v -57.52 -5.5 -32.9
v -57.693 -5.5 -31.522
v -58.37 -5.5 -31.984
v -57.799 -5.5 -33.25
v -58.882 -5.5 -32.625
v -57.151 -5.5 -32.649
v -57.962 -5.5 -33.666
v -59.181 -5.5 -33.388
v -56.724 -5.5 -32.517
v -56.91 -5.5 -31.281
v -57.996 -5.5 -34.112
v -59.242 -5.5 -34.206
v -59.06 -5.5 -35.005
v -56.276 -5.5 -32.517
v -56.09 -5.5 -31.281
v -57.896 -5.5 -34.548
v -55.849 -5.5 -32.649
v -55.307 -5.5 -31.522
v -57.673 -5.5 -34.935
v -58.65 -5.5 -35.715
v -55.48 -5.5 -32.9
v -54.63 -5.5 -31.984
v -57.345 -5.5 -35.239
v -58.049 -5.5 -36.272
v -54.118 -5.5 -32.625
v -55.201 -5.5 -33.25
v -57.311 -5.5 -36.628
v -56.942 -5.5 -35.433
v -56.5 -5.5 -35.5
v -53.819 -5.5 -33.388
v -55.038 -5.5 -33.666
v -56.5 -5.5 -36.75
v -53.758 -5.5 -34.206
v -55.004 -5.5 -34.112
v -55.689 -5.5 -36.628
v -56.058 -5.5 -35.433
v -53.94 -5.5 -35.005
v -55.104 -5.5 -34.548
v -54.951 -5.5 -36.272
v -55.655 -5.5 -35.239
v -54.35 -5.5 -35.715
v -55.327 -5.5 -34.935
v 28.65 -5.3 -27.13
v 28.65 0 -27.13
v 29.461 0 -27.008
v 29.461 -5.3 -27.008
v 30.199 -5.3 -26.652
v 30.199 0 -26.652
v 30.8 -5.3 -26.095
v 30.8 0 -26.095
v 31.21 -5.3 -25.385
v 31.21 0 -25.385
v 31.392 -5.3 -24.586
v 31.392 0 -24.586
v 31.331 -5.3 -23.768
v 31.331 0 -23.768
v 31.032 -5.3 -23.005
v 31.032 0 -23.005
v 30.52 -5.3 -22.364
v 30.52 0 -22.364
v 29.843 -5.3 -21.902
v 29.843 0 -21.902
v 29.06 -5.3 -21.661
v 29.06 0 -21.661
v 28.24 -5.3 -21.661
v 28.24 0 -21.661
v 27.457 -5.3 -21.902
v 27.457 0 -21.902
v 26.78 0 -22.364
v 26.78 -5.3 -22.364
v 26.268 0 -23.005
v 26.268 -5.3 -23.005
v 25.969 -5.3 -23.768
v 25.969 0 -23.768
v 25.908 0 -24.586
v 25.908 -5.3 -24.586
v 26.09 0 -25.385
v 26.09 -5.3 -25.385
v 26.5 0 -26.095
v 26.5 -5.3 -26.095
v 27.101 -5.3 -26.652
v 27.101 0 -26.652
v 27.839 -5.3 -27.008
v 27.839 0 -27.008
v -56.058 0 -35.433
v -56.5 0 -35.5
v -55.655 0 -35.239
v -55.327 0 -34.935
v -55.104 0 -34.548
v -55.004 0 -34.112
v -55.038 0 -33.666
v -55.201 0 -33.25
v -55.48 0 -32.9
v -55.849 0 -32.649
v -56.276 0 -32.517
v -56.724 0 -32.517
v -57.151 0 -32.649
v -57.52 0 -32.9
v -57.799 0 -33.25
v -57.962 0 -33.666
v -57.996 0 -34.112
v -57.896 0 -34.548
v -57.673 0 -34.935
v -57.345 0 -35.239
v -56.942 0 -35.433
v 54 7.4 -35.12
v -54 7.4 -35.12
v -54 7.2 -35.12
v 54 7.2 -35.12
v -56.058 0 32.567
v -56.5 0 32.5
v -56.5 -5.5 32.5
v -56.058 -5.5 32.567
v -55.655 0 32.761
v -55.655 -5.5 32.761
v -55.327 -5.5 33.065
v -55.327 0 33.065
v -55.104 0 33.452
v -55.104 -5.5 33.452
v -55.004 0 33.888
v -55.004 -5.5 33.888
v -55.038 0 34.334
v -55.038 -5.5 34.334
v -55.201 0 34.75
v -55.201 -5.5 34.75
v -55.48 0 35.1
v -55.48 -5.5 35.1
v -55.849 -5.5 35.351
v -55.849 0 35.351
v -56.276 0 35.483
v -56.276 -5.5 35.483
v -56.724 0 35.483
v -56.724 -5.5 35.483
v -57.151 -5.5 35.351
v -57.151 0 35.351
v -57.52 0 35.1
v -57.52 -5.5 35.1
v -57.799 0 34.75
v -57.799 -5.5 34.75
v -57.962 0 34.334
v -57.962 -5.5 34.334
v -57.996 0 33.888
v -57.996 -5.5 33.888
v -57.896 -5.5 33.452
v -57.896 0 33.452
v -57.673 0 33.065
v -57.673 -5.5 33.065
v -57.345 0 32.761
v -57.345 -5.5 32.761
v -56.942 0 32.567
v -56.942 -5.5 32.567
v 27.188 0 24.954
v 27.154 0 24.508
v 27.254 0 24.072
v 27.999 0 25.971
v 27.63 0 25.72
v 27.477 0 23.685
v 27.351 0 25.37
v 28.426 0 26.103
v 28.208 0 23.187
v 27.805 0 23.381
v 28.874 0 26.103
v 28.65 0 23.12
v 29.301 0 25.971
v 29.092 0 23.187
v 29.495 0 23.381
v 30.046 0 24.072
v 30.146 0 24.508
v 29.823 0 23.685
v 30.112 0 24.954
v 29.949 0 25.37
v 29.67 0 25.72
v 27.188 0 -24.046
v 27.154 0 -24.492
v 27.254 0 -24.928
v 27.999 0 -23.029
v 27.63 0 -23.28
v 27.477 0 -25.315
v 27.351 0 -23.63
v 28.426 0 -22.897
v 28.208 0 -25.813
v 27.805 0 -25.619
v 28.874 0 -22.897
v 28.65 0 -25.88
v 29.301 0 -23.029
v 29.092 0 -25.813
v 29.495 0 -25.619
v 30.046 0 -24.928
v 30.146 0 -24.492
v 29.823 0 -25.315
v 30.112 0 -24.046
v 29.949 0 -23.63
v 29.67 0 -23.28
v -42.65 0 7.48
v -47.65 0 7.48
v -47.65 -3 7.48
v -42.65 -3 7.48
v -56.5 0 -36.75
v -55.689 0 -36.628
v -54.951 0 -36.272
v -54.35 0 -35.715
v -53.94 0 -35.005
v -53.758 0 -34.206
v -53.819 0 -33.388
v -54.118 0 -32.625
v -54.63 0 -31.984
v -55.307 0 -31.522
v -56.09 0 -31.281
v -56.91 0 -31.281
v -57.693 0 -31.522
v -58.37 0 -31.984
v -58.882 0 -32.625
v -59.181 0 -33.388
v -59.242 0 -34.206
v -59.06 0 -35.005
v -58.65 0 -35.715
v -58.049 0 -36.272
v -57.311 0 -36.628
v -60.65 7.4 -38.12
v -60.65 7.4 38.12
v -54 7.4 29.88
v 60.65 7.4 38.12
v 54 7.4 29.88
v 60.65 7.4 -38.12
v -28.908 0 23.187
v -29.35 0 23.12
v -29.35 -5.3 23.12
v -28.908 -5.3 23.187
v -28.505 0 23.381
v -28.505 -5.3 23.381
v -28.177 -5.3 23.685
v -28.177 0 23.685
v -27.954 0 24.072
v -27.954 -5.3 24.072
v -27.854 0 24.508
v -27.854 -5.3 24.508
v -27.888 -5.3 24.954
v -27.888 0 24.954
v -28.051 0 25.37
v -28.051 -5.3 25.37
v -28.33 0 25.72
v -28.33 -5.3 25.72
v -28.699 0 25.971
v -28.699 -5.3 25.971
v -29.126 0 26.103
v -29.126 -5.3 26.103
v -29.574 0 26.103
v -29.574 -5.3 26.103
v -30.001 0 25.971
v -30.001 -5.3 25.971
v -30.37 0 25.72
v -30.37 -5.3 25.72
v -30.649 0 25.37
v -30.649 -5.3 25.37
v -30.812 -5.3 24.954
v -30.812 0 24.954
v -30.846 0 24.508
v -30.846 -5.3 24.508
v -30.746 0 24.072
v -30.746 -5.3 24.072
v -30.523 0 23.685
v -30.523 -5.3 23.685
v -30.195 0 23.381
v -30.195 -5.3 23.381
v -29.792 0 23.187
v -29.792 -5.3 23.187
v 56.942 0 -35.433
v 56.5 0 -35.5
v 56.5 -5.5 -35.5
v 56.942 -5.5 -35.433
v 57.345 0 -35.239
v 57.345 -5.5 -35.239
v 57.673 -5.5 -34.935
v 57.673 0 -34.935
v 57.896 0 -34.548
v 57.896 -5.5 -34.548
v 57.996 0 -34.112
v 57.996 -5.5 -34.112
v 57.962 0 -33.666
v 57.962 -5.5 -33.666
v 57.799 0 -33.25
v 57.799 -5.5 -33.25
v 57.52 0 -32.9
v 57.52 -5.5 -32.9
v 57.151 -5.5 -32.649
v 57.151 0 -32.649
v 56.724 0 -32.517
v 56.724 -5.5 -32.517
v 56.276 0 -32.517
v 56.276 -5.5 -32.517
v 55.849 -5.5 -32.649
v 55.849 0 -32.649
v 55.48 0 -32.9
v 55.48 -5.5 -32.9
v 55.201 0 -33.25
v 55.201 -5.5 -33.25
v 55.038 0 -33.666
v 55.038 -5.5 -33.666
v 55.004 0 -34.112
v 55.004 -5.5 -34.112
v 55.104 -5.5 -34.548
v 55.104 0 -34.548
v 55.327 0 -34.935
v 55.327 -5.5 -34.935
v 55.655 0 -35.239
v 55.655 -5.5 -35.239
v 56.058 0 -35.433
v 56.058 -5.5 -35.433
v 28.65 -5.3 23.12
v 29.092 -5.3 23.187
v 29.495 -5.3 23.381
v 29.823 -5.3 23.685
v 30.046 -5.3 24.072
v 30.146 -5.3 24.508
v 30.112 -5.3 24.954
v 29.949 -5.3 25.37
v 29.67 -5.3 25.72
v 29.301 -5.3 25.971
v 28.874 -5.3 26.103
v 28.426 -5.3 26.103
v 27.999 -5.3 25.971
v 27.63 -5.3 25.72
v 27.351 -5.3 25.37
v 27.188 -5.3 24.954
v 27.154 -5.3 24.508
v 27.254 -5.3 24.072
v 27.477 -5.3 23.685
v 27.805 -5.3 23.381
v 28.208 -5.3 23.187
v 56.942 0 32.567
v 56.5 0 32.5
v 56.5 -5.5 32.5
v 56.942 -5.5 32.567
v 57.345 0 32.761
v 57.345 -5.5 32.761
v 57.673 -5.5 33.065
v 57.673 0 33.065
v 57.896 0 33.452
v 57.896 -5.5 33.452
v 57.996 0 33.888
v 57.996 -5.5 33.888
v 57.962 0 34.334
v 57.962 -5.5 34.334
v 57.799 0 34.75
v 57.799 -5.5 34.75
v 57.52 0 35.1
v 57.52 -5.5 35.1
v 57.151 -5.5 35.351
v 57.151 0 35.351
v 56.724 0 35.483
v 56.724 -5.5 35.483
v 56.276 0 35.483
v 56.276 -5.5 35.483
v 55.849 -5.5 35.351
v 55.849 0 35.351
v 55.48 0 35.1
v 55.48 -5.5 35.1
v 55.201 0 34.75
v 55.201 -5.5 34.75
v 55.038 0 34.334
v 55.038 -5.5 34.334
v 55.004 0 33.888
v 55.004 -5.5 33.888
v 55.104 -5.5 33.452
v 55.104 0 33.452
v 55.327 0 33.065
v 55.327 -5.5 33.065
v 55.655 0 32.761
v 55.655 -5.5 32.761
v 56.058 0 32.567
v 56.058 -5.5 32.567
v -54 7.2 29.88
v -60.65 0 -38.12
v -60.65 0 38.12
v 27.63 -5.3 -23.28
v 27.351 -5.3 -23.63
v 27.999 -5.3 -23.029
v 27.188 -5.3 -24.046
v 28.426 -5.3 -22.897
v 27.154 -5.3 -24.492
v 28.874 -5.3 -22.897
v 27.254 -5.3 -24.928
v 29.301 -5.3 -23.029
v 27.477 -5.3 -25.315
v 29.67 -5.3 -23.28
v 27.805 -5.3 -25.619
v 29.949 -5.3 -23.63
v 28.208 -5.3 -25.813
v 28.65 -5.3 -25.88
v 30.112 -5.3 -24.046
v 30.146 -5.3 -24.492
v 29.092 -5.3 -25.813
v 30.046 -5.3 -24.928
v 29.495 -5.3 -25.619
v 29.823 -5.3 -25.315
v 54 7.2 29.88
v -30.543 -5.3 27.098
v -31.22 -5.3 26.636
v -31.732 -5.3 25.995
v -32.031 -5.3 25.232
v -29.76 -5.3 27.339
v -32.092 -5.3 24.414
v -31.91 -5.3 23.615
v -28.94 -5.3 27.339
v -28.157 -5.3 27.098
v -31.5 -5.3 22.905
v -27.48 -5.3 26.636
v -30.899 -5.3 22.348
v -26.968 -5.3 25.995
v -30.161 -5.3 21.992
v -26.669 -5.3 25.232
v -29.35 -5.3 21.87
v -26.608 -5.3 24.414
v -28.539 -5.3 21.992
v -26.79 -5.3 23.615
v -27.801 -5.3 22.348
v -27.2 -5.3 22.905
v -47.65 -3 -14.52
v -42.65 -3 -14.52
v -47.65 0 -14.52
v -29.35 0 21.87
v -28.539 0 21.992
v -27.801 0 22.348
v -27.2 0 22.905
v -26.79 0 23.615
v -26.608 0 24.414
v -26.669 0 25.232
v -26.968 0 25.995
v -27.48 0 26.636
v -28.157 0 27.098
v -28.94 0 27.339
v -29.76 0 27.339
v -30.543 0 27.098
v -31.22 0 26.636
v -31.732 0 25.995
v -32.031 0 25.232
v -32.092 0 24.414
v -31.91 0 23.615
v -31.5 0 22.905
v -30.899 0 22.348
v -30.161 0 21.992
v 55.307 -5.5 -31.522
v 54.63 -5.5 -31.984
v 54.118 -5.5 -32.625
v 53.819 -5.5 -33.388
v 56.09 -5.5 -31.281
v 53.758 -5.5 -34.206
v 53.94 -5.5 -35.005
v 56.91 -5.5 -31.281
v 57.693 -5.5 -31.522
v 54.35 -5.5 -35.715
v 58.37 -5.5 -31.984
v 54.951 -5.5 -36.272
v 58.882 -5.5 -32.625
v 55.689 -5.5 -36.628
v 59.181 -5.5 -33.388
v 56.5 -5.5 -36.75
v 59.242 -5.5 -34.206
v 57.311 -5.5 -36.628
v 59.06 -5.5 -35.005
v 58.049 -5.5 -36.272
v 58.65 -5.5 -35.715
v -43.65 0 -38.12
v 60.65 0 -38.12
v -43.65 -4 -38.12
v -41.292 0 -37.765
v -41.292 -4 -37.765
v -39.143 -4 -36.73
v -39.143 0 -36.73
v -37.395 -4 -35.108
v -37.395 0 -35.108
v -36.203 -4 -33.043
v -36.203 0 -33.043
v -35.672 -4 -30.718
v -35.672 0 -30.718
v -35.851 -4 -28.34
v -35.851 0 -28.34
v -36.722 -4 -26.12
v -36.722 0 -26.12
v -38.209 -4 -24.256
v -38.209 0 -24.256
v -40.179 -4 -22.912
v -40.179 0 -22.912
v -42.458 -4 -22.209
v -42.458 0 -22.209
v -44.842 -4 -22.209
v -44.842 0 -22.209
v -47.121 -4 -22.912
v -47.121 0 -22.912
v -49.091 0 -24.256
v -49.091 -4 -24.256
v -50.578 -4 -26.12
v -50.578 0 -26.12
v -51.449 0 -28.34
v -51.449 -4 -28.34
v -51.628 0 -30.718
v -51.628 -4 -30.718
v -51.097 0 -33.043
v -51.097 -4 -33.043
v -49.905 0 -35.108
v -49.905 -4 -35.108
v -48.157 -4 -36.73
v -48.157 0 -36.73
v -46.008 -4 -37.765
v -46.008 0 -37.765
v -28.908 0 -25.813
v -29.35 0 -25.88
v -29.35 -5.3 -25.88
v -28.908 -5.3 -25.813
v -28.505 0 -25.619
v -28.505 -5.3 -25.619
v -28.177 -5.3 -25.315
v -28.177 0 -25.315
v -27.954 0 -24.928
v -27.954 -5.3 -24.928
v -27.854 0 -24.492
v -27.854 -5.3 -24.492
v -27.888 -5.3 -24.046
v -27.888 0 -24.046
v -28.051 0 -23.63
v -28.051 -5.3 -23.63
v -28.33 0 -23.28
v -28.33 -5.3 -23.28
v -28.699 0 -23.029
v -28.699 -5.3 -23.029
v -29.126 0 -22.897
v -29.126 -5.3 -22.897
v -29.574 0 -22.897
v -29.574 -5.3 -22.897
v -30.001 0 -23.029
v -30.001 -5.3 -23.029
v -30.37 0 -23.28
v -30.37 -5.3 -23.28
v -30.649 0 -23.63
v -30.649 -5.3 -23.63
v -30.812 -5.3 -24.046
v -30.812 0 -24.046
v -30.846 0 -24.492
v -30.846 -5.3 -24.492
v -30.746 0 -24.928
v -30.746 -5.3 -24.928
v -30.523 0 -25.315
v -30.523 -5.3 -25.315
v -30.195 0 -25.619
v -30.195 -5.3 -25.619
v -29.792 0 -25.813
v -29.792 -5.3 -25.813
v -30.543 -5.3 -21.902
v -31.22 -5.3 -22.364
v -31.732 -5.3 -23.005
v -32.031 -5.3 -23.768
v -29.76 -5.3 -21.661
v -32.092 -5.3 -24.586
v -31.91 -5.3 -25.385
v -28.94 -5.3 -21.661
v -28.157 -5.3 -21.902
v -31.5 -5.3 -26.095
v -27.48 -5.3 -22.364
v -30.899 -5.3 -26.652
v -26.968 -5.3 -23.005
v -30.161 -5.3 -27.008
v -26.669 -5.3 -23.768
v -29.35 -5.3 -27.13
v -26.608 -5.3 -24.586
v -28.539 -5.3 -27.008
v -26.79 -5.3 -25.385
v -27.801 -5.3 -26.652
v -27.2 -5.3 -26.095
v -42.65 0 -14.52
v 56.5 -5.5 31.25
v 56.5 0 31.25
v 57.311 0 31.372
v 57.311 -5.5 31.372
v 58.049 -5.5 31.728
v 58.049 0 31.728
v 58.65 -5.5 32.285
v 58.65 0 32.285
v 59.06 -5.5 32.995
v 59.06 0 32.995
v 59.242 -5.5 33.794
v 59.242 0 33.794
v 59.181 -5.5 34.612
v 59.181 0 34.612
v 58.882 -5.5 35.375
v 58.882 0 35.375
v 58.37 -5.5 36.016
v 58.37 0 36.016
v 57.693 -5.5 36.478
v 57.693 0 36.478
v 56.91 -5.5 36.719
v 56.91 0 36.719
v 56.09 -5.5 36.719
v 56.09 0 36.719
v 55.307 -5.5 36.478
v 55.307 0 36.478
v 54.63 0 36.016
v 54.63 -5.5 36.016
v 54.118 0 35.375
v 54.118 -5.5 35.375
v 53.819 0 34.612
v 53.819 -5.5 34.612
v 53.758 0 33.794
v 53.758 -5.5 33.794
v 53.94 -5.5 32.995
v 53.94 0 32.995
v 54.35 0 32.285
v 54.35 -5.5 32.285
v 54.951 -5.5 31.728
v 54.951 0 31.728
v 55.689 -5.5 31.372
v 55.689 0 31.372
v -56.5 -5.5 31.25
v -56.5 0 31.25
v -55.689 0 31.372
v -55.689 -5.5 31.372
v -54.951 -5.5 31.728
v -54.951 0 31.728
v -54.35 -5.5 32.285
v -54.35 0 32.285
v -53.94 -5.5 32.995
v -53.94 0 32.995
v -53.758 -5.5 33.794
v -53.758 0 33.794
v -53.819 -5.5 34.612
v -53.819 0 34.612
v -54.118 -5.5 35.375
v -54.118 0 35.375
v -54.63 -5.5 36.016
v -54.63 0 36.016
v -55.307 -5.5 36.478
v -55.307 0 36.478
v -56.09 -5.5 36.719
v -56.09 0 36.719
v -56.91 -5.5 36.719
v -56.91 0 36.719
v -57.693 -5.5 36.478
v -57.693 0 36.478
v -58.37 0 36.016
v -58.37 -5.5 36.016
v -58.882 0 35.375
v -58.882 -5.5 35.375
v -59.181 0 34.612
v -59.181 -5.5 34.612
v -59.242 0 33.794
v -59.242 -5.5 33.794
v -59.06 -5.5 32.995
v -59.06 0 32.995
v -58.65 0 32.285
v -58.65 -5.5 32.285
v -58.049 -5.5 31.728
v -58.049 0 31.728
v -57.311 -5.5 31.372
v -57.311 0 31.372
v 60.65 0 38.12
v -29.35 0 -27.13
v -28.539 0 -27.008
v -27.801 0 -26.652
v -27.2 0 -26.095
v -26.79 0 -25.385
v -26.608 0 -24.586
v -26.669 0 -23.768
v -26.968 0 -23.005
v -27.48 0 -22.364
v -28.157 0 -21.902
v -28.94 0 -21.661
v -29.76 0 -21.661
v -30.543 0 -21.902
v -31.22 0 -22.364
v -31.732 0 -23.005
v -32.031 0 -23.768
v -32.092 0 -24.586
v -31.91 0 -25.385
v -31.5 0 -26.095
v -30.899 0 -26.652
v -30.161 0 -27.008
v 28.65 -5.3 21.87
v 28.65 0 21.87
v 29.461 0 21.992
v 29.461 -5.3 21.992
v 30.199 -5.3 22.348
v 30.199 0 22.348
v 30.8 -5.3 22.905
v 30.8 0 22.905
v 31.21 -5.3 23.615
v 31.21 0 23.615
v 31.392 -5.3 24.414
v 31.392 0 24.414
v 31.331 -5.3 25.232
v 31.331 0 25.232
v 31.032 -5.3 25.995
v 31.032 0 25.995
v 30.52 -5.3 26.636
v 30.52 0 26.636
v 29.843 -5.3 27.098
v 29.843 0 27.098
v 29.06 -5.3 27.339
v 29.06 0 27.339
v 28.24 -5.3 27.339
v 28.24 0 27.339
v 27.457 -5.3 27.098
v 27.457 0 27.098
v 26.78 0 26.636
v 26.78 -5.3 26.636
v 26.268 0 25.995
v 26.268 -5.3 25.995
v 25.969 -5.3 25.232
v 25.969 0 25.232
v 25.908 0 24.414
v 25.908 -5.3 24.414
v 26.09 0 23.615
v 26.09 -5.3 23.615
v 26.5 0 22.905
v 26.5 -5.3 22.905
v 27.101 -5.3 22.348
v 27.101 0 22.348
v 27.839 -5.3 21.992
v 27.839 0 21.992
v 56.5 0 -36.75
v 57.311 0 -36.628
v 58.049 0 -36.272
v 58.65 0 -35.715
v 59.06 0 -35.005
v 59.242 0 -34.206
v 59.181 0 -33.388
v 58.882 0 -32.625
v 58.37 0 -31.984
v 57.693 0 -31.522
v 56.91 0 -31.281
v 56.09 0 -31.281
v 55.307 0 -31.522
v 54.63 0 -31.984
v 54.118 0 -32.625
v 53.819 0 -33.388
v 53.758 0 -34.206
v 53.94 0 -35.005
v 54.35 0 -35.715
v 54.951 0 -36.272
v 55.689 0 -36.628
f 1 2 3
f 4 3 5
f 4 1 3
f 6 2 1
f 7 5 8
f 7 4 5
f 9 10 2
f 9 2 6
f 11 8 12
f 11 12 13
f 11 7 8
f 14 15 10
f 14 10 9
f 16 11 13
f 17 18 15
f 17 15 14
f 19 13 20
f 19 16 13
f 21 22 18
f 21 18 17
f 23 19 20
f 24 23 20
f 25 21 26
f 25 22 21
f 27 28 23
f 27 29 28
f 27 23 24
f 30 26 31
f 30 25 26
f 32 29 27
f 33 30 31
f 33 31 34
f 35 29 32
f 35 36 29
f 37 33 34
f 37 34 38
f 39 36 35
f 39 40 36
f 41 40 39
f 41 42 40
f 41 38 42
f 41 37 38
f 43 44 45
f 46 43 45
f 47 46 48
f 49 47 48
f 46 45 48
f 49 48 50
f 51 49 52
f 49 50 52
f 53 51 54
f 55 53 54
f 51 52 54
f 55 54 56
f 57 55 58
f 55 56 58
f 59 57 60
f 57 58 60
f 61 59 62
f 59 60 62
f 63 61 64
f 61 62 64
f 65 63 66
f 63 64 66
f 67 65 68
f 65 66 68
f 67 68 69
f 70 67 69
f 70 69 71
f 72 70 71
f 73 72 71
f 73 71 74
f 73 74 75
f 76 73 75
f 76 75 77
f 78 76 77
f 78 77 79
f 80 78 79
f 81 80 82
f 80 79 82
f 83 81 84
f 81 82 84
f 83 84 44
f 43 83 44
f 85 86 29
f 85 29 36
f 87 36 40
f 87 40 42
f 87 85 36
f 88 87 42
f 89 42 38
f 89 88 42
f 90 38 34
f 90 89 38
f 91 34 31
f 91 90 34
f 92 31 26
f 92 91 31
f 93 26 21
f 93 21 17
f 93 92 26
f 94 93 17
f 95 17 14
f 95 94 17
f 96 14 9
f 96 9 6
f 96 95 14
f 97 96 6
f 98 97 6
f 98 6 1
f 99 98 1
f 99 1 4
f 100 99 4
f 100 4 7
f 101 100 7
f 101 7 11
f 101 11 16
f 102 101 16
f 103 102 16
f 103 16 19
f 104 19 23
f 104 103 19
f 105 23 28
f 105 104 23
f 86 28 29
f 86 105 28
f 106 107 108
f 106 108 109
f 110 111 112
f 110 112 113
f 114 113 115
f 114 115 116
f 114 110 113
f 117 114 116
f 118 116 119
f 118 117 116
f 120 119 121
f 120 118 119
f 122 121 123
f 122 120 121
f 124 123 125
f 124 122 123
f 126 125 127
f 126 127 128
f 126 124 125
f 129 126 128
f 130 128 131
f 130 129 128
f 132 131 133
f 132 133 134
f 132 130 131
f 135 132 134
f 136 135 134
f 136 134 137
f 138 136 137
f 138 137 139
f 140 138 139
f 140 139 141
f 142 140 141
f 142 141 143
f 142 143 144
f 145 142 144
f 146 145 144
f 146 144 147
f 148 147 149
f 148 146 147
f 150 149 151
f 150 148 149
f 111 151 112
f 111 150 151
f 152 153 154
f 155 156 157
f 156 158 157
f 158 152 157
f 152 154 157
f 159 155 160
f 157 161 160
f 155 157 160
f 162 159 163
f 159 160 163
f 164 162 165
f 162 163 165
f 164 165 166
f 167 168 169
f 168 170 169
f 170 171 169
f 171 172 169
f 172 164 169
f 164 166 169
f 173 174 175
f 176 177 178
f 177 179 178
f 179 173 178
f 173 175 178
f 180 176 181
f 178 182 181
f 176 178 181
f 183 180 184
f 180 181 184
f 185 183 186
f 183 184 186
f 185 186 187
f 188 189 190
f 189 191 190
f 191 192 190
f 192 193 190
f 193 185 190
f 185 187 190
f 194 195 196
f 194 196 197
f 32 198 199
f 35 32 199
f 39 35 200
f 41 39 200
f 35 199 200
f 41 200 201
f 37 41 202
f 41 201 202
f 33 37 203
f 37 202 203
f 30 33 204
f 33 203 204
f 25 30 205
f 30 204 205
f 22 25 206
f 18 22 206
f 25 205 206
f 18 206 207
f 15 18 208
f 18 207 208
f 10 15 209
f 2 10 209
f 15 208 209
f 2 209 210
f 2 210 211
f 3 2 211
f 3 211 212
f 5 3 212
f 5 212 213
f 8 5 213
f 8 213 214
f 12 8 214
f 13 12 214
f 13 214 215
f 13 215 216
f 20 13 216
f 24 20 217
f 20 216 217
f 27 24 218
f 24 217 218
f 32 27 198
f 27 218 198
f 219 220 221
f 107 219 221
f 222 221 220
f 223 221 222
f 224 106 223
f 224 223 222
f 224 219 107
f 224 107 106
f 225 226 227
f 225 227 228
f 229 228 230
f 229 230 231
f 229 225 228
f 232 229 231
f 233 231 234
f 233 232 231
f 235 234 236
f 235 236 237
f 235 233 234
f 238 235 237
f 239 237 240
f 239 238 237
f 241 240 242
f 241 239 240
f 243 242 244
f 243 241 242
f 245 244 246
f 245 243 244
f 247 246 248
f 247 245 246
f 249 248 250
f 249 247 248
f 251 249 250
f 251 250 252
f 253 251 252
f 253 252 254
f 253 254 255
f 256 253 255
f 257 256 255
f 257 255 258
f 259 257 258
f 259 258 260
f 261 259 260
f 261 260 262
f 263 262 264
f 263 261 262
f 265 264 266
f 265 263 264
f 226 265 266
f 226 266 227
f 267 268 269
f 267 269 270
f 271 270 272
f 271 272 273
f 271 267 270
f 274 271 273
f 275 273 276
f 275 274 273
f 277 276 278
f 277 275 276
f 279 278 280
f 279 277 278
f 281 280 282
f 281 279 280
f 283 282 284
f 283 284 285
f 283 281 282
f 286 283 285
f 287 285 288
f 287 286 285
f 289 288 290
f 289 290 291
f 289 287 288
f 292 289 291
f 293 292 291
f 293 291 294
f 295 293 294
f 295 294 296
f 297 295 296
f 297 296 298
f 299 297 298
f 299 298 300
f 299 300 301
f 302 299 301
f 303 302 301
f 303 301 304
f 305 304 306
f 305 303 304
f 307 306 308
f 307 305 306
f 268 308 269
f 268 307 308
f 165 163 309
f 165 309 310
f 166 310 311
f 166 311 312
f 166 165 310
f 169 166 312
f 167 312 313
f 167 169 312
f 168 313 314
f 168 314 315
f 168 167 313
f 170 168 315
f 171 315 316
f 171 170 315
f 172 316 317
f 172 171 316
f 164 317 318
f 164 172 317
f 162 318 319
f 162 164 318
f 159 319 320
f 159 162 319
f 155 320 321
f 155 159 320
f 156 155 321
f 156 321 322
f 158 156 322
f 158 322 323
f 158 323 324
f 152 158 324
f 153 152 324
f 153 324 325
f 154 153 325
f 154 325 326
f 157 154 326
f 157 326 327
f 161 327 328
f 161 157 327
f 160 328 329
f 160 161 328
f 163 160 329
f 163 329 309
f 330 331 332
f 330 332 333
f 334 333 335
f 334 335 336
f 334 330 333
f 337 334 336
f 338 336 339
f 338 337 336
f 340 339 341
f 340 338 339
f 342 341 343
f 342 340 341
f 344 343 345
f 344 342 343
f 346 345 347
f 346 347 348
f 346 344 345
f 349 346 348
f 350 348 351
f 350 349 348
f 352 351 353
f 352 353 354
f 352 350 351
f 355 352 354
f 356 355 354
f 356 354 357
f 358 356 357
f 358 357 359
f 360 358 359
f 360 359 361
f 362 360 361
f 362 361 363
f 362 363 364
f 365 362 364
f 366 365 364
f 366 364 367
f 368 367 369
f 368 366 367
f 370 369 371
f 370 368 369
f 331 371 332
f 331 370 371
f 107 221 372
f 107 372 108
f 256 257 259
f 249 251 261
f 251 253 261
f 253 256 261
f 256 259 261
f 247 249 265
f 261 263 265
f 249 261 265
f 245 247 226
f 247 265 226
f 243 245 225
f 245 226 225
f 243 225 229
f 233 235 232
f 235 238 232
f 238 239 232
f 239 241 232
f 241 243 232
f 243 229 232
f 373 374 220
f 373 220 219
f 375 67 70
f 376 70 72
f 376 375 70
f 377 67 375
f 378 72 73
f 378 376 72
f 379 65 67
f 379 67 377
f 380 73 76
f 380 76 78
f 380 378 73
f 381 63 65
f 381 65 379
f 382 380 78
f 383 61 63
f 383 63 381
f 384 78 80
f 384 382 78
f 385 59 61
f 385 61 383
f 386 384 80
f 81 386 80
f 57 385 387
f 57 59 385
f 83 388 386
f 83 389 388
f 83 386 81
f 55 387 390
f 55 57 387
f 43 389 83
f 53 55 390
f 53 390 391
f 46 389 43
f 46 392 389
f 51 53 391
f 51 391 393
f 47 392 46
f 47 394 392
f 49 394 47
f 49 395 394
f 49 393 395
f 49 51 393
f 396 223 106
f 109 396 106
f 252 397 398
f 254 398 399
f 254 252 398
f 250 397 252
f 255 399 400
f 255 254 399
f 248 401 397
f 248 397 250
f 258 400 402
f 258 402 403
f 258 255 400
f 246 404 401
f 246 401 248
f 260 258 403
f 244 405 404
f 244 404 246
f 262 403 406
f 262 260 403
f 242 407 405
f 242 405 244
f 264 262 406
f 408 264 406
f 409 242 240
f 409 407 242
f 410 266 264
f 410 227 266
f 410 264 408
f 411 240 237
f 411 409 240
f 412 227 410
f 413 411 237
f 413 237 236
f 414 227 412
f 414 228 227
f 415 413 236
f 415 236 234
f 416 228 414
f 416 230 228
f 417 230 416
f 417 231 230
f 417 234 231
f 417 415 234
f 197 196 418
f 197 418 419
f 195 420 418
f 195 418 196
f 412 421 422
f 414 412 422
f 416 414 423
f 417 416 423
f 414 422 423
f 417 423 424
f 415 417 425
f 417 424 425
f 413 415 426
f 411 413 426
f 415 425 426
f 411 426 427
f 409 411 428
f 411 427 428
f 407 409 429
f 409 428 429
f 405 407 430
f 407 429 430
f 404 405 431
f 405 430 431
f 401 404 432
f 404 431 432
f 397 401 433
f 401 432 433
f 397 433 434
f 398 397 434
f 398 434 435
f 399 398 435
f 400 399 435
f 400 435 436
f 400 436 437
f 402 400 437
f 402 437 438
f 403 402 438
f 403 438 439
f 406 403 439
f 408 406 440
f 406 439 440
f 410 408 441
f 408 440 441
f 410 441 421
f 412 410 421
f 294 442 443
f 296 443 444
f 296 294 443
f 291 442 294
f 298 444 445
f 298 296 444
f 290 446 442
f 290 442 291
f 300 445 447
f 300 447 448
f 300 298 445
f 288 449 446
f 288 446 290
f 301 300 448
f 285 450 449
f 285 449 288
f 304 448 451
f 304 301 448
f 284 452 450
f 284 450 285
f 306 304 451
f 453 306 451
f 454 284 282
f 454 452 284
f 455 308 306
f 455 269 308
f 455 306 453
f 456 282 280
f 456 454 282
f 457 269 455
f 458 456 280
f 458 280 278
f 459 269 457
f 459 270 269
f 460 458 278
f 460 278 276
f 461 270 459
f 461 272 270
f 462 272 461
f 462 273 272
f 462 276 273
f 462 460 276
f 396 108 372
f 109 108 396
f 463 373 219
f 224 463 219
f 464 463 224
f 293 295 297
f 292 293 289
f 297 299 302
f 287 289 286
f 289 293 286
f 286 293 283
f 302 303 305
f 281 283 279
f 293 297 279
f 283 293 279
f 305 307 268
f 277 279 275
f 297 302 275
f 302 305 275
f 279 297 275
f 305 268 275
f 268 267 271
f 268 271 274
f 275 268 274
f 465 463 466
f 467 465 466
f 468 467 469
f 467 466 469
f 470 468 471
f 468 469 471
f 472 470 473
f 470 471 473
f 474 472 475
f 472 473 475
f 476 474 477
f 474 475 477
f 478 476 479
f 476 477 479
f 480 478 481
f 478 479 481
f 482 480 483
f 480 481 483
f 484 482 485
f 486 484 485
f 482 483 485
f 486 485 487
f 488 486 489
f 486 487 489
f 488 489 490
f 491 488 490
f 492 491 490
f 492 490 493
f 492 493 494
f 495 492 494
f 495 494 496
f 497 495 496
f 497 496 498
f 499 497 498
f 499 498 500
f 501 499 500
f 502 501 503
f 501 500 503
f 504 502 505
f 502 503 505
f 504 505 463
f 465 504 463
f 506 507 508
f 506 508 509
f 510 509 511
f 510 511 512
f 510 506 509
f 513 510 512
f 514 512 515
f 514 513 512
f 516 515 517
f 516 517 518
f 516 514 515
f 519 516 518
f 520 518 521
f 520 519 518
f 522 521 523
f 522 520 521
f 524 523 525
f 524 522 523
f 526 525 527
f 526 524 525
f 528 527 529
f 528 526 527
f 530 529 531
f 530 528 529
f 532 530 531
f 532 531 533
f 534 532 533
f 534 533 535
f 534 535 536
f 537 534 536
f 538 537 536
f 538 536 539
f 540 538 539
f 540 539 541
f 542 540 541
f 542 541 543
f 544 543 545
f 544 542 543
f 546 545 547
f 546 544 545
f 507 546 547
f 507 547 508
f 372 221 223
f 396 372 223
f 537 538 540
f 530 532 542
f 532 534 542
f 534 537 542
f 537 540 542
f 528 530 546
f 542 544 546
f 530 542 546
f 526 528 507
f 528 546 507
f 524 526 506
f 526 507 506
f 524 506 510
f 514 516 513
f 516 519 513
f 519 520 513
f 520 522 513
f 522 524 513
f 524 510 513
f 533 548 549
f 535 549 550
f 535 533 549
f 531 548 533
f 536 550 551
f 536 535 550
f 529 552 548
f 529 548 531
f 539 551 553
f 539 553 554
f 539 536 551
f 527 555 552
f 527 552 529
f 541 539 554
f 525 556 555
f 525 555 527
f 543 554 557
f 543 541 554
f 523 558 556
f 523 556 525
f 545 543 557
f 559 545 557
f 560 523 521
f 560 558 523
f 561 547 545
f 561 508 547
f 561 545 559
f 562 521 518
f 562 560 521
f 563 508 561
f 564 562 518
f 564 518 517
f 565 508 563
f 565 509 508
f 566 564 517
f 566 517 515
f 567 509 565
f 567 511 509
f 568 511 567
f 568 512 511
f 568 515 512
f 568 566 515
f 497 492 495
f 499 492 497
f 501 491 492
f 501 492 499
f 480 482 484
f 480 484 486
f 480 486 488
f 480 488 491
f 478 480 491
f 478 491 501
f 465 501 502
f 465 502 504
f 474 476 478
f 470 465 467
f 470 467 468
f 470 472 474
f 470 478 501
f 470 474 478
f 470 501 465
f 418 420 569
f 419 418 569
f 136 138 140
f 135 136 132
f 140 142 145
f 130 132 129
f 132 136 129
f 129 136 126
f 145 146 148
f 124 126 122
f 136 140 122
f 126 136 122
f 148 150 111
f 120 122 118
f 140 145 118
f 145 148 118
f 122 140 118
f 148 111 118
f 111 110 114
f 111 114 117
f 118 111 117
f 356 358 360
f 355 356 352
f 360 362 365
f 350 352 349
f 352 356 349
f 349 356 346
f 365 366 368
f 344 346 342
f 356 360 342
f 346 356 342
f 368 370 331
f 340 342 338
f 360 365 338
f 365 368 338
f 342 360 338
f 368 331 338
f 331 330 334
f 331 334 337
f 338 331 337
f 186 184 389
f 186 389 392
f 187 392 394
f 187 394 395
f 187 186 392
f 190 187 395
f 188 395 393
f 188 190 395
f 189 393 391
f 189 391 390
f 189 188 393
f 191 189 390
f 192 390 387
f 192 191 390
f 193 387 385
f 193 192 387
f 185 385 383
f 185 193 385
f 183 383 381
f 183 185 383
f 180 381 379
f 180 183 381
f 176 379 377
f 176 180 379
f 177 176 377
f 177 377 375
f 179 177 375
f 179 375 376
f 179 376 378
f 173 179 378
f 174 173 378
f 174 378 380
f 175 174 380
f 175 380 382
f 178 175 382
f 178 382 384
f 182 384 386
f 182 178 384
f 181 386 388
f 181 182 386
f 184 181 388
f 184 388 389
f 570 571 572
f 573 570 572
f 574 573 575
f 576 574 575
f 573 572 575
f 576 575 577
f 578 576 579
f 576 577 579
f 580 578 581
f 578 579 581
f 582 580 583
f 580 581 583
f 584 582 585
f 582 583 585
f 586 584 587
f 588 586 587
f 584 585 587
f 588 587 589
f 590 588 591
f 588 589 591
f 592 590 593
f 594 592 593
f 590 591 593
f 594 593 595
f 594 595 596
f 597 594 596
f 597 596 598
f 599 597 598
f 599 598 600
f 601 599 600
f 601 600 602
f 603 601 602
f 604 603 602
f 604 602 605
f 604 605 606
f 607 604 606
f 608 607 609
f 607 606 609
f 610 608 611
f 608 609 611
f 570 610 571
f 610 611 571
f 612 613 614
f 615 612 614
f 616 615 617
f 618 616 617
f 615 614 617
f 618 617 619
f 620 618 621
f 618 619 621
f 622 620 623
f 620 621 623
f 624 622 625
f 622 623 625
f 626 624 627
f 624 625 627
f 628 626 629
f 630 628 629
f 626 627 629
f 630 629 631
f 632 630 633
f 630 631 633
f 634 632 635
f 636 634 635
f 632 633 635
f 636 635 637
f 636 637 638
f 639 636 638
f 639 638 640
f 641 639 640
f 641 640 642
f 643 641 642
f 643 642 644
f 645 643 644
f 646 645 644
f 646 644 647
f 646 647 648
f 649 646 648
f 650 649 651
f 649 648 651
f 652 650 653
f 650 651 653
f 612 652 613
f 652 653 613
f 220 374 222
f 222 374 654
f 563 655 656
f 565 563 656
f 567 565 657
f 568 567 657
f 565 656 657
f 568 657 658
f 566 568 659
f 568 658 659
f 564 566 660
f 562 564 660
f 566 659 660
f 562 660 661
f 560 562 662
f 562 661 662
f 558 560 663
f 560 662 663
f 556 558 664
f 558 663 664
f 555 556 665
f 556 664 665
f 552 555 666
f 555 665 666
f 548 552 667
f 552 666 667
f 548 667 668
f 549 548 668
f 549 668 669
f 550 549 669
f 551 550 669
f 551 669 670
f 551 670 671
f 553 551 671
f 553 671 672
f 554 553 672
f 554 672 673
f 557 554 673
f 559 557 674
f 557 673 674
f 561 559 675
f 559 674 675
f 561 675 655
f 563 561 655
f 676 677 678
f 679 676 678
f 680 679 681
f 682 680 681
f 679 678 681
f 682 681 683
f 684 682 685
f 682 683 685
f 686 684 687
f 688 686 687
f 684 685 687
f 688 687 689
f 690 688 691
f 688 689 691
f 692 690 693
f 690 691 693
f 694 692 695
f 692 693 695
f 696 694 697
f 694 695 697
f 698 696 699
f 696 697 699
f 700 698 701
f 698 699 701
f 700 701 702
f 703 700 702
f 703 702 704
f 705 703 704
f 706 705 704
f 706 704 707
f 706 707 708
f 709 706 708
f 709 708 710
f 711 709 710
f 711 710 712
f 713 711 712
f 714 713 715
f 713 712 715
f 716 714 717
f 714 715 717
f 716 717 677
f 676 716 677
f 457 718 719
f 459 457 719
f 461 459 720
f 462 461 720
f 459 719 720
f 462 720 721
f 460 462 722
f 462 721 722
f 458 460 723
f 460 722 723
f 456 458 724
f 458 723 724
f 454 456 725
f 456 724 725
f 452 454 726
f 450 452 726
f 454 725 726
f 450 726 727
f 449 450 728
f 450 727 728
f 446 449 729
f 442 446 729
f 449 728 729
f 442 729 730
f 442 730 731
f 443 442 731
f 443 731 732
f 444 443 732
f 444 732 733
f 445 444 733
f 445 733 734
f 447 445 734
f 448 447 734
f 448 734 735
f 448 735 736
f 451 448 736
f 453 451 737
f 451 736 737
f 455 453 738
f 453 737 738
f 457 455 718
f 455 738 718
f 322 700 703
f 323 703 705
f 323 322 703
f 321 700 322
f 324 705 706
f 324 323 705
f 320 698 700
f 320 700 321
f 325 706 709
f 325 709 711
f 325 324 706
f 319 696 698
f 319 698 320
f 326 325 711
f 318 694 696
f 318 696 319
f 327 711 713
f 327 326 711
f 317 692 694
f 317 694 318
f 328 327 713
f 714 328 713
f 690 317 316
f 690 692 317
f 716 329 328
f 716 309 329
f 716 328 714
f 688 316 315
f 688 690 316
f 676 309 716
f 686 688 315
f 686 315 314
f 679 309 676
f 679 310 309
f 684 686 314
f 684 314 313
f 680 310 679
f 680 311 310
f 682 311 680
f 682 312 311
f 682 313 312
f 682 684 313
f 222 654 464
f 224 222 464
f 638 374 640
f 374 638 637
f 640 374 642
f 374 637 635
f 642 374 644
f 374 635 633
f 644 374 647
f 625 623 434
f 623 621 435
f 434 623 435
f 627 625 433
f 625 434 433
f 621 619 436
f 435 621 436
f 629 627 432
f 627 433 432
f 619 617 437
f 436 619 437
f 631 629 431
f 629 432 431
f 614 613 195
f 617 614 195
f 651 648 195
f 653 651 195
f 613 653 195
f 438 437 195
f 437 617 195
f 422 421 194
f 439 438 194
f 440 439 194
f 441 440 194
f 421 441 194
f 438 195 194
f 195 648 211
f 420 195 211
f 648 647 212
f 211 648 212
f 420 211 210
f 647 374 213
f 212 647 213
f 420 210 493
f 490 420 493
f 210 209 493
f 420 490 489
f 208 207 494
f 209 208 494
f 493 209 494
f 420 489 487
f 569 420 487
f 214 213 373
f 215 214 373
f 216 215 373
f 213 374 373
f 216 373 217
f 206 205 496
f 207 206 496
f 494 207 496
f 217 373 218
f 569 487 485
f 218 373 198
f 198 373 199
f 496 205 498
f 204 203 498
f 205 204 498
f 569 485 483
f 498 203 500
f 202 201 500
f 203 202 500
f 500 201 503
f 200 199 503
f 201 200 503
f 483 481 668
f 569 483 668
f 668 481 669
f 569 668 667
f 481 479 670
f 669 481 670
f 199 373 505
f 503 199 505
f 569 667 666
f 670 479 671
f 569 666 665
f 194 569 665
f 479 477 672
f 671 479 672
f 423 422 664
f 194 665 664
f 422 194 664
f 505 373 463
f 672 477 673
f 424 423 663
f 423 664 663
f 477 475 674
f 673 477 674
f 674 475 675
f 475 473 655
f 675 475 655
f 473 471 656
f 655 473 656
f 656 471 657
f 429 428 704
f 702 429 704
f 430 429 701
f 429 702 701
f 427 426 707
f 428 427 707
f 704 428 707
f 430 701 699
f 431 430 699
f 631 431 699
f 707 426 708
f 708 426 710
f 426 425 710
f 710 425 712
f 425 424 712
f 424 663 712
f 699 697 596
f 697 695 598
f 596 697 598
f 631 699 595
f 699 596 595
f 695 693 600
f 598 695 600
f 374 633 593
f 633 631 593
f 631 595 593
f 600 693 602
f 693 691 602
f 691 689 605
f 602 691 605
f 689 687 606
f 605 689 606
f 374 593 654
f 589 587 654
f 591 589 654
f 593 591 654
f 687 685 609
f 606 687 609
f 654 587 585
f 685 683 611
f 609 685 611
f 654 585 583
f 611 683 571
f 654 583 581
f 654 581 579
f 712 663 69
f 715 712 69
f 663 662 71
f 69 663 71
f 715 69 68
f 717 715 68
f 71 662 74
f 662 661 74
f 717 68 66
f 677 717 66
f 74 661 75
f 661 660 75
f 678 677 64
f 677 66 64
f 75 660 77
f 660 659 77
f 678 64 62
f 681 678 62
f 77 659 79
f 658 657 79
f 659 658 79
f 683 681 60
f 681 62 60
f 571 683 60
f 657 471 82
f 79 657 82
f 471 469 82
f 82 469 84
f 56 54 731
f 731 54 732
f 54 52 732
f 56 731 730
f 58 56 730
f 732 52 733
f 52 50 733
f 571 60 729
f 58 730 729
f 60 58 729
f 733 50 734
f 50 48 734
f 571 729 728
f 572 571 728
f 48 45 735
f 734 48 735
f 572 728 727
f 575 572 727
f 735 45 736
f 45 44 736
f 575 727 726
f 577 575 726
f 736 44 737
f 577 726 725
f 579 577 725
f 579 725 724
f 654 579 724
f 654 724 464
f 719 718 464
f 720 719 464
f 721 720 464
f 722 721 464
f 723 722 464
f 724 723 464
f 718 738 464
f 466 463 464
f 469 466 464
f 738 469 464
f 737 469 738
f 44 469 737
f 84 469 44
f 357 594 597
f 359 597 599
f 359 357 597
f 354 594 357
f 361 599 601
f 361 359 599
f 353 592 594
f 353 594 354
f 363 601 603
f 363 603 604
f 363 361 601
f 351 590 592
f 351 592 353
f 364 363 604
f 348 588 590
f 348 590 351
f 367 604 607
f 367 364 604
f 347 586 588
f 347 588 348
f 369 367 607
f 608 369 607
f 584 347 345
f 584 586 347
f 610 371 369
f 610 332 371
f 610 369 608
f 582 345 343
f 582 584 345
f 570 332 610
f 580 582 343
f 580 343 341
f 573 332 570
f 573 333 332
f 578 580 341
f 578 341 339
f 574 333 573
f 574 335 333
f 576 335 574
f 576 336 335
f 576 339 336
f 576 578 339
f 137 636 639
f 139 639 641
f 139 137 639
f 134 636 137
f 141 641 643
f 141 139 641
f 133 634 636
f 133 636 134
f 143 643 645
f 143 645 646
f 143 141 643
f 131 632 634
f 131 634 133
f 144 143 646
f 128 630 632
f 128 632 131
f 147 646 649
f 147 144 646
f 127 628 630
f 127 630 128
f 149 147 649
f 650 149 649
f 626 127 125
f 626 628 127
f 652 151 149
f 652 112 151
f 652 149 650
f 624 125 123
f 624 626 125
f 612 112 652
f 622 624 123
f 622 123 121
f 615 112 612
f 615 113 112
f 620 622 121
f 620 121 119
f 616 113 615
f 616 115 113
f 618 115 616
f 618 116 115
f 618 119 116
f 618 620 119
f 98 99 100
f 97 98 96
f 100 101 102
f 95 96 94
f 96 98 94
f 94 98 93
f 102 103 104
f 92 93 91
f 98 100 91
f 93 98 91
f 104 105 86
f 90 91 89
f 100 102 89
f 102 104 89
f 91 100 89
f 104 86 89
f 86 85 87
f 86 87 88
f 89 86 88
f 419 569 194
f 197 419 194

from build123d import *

# Parameters (mm, degrees)
SKETCH1_W           = 121.3
SKETCH1_H           = 76.24
BOSS_EXTRUDE1_DEPTH = 7.4
SKETCH2_R           = 2.75
SKETCH2_R_2         = 1.5
BOSS_EXTRUDE2_DEPTH = 5.5
SKETCH3_R           = 2.75
SKETCH3_R_2         = 1.5
BOSS_EXTRUDE3_DEPTH = 5.3
SKETCH4_W           = 108
SKETCH4_H           = 65
CUT_EXTRUDE1_DEPTH  = 0.2
SKETCH5_R           = 8
BOSS_EXTRUDE4_DEPTH = 4
SKETCH6_W           = 5
SKETCH6_H           = 22
BOSS_EXTRUDE5_DEPTH = 3


with BuildPart() as part:
    # Sketch1 → Boss-Extrude1 (new body)
    with BuildSketch(Plane(origin=(0, 0, 0), x_dir=(1, 0, 0), z_dir=(0, 1, 0))):
        Rectangle(SKETCH1_W, SKETCH1_H)
    extrude(amount=BOSS_EXTRUDE1_DEPTH)

    # Sketch2 → Boss-Extrude2 (add)
    # profile 1 of 4: a face of its own
    with BuildSketch(Plane.XZ):
        with Locations(Location((-56.5, 34, 0), (0, 0, 270))):
            Circle(SKETCH2_R)
        with Locations(Location((-56.5, 34, 0), (0, 0, 270))):
            Circle(SKETCH2_R_2, mode=Mode.SUBTRACT)
    # profile 2 of 4: a face of its own
    with BuildSketch(Plane.XZ):
        with Locations(Location((56.5, 34, 0), (0, 0, 270))):
            Circle(SKETCH2_R)
        with Locations(Location((56.5, 34, 0), (0, 0, 270))):
            Circle(SKETCH2_R_2, mode=Mode.SUBTRACT)
    # profile 3 of 4: a face of its own
    with BuildSketch(Plane.XZ):
        with Locations(Location((56.5, -34, 0), (0, 0, 270))):
            Circle(SKETCH2_R)
        with Locations(Location((56.5, -34, 0), (0, 0, 270))):
            Circle(SKETCH2_R_2, mode=Mode.SUBTRACT)
    # profile 4 of 4: a face of its own
    with BuildSketch(Plane.XZ):
        with Locations(Location((-56.5, -34, 0), (0, 0, 270))):
            Circle(SKETCH2_R)
        with Locations(Location((-56.5, -34, 0), (0, 0, 270))):
            Circle(SKETCH2_R_2, mode=Mode.SUBTRACT)
    extrude(amount=BOSS_EXTRUDE2_DEPTH)

    # Sketch3 → Boss-Extrude3 (add)
    # profile 1 of 4: a face of its own
    with BuildSketch(Plane.XZ):
        with Locations(Location((-29.35, 24.62, 0), (0, 0, 270))):
            Circle(SKETCH3_R)
        with Locations(Location((-29.35, 24.62, 0), (0, 0, 270))):
            Circle(SKETCH3_R_2, mode=Mode.SUBTRACT)
    # profile 2 of 4: a face of its own
    with BuildSketch(Plane.XZ):
        with Locations(Location((28.65, 24.62, 0), (0, 0, 270))):
            Circle(SKETCH3_R)
        with Locations(Location((28.65, 24.62, 0), (0, 0, 270))):
            Circle(SKETCH3_R_2, mode=Mode.SUBTRACT)
    # profile 3 of 4: a face of its own
    with BuildSketch(Plane.XZ):
        with Locations(Location((28.65, -24.38, 0), (0, 0, 270))):
            Circle(SKETCH3_R)
        with Locations(Location((28.65, -24.38, 0), (0, 0, 270))):
            Circle(SKETCH3_R_2, mode=Mode.SUBTRACT)
    # profile 4 of 4: a face of its own
    with BuildSketch(Plane.XZ):
        with Locations(Location((-29.35, -24.38, 0), (0, 0, 270))):
            Circle(SKETCH3_R)
        with Locations(Location((-29.35, -24.38, 0), (0, 0, 270))):
            Circle(SKETCH3_R_2, mode=Mode.SUBTRACT)
    extrude(amount=BOSS_EXTRUDE3_DEPTH)

    # Sketch4 → Cut-Extrude1 (cut)
    with BuildSketch(Plane(origin=(0, 7.4, 0), x_dir=(1, 0, 0), z_dir=(0, 1, 0))):
        with Locations((0, 2.62)):
            Rectangle(SKETCH4_W, SKETCH4_H)
    extrude(amount=-CUT_EXTRUDE1_DEPTH, mode=Mode.SUBTRACT)

    # Sketch5 → Boss-Extrude4 (add)
    with BuildSketch(Plane(origin=(0, 0, 0), x_dir=(-1, 0, 0), z_dir=(0, -1, 0))):
        with Locations(Location((43.65, 30.12, 0), (0, 0, 90))):
            Circle(SKETCH5_R)
    extrude(amount=BOSS_EXTRUDE4_DEPTH)

    # Sketch6 → Boss-Extrude5 (add)
    with BuildSketch(Plane.XZ):
        with Locations((-45.15, -3.52)):
            Rectangle(SKETCH6_W, SKETCH6_H)
    extrude(amount=BOSS_EXTRUDE5_DEPTH)


solid = part.part
